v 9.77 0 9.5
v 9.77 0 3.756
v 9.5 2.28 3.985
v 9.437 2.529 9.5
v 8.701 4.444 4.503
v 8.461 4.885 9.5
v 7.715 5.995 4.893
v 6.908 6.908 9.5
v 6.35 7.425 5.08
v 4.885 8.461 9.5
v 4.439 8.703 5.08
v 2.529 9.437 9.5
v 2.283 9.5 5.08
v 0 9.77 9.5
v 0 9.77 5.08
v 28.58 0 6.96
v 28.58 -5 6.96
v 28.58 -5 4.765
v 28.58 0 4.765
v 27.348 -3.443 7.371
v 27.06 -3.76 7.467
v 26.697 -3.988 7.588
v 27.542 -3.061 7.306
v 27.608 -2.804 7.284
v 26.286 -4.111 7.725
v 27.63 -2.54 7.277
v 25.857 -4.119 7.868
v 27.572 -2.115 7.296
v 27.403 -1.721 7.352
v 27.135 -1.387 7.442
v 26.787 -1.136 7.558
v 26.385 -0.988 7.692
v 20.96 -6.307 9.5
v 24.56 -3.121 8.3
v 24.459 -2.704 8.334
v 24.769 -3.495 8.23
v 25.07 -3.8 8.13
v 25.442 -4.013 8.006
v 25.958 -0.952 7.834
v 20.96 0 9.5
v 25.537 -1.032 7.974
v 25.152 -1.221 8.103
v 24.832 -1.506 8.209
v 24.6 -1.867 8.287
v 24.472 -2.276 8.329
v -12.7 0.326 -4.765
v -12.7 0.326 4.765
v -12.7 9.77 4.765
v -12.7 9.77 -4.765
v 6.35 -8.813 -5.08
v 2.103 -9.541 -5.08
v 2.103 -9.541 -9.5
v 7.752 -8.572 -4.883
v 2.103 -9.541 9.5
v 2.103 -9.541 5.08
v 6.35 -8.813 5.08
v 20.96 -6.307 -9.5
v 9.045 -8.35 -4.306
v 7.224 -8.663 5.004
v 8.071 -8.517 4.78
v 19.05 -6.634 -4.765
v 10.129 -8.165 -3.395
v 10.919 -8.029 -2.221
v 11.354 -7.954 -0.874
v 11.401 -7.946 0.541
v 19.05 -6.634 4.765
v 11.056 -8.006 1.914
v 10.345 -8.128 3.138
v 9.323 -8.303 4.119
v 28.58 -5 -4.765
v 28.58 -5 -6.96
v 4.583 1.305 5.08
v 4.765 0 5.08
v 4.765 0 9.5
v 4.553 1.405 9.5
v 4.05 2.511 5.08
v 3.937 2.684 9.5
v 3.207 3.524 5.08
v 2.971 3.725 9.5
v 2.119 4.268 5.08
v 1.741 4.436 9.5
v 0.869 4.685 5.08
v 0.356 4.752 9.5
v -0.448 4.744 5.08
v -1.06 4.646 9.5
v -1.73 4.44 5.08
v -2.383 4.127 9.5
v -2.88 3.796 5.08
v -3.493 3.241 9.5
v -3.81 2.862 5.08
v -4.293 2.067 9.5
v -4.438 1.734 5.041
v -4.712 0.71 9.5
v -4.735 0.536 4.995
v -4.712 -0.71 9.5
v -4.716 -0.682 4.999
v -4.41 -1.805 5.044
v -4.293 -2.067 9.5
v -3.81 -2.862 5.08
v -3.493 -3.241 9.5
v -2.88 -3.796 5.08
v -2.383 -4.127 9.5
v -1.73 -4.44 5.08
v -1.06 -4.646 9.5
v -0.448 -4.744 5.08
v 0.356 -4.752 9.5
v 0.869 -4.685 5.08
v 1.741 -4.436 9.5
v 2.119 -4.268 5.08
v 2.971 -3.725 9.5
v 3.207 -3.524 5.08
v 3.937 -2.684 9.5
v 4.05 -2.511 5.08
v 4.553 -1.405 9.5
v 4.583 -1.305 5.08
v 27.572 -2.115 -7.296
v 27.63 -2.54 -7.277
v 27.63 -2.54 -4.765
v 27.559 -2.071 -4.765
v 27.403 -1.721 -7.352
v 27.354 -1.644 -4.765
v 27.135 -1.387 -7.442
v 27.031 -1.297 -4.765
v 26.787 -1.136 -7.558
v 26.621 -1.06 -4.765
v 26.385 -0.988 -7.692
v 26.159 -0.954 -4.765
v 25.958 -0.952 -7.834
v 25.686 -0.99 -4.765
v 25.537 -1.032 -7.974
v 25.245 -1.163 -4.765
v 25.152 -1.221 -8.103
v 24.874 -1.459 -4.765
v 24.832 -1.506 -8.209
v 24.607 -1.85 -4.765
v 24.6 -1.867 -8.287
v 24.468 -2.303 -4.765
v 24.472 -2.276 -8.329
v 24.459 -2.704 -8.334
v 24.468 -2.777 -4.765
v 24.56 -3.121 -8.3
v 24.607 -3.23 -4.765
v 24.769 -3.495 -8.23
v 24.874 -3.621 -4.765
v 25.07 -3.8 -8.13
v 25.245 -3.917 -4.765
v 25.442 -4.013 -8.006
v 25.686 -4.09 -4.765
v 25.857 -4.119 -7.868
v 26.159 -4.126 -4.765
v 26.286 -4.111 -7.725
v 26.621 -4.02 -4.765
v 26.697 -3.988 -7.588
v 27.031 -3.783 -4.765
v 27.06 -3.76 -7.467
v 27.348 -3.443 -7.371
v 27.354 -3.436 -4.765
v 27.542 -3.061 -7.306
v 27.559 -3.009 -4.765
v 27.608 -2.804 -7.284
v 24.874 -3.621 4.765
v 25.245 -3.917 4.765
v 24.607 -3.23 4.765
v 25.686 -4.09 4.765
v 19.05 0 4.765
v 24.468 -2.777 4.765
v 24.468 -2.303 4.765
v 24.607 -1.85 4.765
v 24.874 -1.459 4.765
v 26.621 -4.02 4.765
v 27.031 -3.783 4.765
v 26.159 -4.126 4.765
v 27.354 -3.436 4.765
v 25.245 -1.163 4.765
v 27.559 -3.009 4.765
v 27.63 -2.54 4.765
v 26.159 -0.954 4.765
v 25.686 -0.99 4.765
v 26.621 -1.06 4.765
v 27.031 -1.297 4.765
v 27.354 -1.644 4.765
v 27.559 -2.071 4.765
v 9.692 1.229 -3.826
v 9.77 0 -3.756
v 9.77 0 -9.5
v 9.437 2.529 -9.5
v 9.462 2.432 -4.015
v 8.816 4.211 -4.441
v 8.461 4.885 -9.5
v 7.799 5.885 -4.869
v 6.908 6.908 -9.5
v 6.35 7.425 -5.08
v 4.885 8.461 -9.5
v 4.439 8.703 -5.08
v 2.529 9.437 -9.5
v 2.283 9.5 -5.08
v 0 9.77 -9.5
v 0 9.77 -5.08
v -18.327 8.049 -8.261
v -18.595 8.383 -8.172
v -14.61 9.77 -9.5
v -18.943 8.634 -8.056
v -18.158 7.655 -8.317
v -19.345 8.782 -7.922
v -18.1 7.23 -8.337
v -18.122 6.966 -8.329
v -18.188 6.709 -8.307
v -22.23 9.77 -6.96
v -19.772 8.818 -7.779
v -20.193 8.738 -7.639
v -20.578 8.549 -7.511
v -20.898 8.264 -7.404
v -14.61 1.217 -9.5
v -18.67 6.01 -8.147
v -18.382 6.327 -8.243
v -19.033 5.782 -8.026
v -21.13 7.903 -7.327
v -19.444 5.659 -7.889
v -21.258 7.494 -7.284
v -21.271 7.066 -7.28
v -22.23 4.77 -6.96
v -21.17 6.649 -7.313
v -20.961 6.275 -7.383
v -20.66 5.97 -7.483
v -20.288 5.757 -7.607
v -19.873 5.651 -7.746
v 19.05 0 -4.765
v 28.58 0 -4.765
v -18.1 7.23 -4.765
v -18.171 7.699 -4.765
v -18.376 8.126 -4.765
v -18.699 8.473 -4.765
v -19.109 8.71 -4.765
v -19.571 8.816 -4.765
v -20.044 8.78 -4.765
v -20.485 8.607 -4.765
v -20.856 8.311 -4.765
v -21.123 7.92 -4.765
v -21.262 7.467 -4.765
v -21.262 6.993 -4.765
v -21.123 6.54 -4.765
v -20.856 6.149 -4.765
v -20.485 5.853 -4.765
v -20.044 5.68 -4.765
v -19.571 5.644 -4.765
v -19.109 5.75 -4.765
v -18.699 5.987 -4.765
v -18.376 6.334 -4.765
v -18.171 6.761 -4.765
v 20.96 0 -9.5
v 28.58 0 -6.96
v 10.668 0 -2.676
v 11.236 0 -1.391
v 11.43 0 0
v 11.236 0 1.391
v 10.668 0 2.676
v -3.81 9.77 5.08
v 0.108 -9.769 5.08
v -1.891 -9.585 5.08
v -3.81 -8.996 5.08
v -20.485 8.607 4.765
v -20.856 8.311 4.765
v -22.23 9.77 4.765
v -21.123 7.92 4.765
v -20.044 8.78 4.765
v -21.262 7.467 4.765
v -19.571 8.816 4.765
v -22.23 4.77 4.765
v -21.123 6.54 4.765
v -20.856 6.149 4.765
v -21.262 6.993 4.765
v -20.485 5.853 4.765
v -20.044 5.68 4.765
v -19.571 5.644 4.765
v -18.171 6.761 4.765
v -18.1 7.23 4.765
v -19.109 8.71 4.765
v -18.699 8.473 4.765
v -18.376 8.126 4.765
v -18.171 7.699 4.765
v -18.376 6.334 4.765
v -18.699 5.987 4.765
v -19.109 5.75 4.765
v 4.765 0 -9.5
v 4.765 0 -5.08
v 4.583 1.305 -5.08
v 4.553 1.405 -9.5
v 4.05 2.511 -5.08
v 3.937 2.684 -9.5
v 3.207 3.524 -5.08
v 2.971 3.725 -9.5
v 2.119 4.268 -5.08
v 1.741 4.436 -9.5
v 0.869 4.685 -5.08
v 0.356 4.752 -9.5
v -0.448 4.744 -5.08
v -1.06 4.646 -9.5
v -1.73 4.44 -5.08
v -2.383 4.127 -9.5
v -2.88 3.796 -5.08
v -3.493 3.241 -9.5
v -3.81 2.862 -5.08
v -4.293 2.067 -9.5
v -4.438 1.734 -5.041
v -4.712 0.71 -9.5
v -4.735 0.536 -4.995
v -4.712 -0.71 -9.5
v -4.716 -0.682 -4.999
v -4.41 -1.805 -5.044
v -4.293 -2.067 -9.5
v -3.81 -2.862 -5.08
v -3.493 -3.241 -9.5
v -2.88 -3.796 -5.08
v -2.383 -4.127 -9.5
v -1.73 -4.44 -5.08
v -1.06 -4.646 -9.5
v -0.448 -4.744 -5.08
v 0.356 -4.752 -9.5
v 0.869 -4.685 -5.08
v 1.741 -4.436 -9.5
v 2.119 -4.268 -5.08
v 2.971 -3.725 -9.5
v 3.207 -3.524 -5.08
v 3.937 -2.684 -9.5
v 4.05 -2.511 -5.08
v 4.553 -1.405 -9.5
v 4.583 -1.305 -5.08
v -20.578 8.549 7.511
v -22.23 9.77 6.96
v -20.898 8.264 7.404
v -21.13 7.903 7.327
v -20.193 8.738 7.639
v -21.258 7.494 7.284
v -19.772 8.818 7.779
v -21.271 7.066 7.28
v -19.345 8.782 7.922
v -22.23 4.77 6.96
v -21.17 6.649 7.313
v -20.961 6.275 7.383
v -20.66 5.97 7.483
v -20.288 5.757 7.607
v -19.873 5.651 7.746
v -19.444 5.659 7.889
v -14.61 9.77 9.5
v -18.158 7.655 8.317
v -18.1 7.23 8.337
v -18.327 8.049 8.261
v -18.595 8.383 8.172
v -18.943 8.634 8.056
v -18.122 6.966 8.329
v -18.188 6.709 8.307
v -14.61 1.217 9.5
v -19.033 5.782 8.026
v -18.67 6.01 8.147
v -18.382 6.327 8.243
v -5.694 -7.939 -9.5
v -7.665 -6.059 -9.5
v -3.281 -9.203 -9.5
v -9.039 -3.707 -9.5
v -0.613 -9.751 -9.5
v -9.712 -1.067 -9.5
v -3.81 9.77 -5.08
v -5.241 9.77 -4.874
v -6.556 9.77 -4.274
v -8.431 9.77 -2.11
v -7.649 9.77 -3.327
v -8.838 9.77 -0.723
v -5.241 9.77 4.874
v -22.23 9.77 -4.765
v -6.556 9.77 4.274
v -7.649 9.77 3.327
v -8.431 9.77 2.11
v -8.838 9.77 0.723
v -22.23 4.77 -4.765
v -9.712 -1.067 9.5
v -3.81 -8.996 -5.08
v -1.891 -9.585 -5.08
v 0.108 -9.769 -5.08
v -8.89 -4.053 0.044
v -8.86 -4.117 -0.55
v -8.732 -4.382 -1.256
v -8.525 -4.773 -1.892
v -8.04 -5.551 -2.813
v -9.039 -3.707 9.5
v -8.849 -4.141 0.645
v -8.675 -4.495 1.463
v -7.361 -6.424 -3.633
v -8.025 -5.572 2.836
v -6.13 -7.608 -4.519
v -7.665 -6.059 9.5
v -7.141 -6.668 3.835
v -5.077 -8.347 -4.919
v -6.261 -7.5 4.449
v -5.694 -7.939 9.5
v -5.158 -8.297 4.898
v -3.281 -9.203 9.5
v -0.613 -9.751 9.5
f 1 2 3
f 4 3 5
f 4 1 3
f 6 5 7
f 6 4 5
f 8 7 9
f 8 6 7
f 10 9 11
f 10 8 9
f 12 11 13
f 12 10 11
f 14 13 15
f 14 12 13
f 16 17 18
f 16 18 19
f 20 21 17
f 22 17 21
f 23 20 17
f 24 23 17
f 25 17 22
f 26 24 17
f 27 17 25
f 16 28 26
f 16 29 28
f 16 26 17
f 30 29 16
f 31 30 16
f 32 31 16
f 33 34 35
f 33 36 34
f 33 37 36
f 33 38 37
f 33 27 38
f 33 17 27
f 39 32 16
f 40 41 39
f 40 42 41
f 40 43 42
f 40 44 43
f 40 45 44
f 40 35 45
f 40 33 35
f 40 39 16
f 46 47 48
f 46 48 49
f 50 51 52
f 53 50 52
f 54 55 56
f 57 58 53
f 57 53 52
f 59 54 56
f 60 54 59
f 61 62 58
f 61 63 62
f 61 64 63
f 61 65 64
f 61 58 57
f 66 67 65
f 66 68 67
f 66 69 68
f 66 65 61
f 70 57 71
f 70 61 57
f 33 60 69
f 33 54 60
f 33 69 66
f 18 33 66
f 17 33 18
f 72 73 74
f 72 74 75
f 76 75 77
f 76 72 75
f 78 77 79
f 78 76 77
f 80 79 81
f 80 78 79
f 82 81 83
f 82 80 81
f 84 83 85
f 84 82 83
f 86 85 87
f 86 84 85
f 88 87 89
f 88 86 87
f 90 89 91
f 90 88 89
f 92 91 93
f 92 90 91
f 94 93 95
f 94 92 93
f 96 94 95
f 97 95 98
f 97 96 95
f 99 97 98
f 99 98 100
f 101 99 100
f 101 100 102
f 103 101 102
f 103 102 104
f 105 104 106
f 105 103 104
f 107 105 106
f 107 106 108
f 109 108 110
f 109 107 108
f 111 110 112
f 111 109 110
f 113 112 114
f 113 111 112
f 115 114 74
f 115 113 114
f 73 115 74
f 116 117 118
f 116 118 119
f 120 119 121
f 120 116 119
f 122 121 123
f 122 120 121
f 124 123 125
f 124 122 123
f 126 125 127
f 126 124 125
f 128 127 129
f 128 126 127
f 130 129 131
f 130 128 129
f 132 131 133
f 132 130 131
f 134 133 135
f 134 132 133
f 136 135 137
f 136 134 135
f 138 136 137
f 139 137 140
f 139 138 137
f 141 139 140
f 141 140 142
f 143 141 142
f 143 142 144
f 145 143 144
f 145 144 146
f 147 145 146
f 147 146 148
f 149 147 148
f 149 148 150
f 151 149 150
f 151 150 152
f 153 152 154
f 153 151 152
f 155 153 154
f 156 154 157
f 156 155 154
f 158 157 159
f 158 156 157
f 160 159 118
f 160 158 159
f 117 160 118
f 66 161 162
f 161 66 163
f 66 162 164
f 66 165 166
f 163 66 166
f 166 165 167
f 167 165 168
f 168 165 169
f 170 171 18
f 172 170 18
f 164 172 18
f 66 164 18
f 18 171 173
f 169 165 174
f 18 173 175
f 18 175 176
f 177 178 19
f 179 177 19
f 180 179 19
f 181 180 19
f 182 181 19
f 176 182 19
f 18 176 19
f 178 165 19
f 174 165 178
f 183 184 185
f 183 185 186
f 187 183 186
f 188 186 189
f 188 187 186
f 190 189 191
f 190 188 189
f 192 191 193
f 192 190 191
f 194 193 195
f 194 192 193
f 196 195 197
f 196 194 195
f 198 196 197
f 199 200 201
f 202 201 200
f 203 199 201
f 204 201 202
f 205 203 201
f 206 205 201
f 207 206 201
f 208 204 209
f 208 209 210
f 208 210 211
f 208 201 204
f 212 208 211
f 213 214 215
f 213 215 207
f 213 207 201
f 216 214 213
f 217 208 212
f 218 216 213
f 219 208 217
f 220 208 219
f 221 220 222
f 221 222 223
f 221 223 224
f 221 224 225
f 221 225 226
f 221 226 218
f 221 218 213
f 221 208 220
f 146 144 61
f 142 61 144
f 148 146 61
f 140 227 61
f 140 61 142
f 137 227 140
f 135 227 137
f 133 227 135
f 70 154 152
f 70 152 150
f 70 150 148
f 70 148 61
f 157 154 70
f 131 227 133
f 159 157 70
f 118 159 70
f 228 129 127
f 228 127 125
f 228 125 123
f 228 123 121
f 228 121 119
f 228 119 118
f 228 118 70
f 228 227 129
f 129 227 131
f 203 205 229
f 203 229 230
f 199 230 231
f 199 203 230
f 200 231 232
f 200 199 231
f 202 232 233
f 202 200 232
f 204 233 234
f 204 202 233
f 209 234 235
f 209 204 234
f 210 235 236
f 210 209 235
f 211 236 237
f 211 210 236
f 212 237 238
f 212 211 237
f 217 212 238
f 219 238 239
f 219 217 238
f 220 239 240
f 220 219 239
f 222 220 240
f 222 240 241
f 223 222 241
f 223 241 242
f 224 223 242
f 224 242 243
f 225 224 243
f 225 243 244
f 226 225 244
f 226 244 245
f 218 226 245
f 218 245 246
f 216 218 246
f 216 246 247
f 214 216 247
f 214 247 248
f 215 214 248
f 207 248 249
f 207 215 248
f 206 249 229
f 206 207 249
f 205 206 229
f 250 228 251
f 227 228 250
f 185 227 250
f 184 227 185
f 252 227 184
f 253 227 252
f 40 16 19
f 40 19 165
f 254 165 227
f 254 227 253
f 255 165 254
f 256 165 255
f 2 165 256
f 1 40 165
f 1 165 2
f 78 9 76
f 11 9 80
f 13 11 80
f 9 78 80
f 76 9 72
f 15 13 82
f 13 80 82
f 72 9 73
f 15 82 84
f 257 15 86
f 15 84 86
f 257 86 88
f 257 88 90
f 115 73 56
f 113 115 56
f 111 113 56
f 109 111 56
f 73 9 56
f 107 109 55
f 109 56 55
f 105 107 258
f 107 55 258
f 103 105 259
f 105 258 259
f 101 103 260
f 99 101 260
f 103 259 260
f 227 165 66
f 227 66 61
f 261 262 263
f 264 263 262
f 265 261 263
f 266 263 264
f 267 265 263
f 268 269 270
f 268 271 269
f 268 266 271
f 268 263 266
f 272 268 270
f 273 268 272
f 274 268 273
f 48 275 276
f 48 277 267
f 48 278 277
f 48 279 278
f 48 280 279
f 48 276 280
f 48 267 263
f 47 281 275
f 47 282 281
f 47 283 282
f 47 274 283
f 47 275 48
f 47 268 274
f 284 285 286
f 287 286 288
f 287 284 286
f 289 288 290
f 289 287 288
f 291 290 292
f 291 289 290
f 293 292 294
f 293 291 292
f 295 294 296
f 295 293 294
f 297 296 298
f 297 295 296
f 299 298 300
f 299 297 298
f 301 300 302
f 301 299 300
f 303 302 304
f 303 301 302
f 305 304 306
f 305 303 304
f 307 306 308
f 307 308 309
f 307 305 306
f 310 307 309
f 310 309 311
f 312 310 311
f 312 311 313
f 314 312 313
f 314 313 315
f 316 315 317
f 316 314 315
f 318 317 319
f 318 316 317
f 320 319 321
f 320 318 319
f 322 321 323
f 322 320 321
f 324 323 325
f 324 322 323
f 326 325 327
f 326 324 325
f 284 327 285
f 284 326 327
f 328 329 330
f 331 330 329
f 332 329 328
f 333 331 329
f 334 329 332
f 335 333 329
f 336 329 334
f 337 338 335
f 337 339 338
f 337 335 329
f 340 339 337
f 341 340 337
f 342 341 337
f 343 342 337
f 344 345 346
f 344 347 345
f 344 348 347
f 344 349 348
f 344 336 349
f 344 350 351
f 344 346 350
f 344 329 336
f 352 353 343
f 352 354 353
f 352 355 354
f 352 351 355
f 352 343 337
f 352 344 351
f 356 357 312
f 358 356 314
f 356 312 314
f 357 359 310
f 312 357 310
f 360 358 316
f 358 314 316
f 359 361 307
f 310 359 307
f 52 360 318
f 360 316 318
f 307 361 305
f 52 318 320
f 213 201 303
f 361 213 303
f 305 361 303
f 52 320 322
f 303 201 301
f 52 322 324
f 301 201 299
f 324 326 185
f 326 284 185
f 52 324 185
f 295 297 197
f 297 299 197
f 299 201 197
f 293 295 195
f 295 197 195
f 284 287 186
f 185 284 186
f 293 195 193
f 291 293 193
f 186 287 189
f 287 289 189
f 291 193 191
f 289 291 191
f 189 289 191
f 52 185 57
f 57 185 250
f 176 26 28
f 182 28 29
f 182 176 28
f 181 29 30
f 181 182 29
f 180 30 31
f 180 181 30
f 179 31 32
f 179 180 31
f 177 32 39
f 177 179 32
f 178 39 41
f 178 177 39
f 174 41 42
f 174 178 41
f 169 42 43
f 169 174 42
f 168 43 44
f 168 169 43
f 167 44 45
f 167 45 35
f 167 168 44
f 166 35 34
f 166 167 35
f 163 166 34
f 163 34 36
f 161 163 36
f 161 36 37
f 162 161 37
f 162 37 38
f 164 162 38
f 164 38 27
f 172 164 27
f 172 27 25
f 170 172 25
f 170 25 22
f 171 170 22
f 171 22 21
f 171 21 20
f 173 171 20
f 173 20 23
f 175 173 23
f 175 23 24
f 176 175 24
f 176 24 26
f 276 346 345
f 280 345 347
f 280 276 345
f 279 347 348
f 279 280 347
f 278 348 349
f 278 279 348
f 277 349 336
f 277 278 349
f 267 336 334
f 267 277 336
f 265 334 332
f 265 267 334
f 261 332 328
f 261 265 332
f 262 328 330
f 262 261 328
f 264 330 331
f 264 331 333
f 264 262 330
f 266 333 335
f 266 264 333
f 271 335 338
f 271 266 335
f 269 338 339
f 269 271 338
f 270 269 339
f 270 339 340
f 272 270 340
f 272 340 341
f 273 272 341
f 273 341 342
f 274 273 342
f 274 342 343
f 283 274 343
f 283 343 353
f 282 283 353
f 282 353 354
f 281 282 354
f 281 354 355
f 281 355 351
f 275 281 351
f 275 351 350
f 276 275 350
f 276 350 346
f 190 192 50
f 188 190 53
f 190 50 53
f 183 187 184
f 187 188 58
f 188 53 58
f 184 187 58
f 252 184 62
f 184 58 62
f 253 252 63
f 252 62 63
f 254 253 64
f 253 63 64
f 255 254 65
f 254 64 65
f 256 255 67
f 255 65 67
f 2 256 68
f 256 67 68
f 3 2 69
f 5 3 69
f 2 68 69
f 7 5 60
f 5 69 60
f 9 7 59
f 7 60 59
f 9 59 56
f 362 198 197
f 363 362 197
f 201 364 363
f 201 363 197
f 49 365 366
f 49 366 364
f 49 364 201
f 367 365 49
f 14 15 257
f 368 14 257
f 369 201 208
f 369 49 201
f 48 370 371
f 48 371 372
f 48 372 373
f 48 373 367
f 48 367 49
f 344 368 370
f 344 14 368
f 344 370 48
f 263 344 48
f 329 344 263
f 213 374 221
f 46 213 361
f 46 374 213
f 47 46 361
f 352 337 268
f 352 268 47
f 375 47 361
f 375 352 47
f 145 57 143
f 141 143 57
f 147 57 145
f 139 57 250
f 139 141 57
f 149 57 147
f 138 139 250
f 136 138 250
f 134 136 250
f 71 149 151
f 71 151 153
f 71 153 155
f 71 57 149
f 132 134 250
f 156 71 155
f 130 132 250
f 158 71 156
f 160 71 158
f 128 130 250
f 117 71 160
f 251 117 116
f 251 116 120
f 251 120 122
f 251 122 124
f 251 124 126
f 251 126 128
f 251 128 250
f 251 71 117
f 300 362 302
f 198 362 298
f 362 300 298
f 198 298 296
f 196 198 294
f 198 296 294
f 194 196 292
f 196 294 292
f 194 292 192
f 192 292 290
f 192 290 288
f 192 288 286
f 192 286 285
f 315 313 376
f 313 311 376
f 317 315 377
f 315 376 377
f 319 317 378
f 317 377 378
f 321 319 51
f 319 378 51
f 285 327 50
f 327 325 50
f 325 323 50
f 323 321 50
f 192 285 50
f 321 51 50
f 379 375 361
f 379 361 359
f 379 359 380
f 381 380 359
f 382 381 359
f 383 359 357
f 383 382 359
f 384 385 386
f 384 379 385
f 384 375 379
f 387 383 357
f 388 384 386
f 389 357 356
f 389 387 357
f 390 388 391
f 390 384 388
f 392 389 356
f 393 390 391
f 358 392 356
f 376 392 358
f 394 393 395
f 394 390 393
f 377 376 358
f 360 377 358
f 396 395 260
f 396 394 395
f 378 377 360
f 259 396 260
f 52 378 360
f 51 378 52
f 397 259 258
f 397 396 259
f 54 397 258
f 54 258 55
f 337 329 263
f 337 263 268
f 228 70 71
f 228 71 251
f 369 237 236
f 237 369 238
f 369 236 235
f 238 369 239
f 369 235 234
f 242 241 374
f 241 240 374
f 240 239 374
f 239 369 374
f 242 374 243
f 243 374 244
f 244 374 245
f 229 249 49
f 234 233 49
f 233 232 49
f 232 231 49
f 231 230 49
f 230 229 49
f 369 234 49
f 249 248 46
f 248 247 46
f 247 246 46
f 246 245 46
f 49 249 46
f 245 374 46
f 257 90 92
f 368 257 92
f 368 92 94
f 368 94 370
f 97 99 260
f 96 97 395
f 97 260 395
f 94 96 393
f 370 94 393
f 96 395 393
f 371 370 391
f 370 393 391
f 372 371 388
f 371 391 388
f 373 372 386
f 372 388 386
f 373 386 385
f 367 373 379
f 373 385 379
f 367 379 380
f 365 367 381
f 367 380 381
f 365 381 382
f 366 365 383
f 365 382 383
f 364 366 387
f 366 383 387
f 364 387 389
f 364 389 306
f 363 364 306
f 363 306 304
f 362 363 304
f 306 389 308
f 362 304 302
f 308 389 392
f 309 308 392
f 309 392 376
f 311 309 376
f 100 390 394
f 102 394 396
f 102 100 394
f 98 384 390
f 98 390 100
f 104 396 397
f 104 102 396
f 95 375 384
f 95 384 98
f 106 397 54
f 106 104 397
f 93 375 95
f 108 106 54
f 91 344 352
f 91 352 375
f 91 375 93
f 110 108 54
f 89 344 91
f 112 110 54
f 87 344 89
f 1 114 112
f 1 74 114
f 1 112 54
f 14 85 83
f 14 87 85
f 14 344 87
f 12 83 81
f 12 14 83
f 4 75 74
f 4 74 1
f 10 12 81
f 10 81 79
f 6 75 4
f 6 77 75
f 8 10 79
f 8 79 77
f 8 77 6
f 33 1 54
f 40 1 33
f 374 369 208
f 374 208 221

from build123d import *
from OCP.BRepFilletAPI import BRepFilletAPI_MakeChamfer

# Parameters (mm, degrees)
SKETCH1_R               = 4.765
BOSS_EXTRUDE1_DEPTH     = 9.5
CHAMFER5_SIZE           = 7.62
CHAMFER5_SIZE2          = 2.54
CHAMFER6_SIZE           = 2.54
CHAMFER6_SIZE2          = 7.62
SKETCH2_W               = 9.53
SKETCH2_H               = 9.53
CUT_EXTRUDE1_DEPTH      = 32.662585176
SKETCH2_2_W             = 9.53
SKETCH2_2_H             = 9.53
CUT_EXTRUDE2_DEPTH      = 32.662585176
CUT_EXTRUDE3_DEPTH      = 32.662585176
CUT_EXTRUDE3_DEPTH_BACK = 32.662585176
CUT_EXTRUDE4_DEPTH      = 32.662585236
CUT_EXTRUDE4_DEPTH_BACK = 32.662585236
SKETCH4_R               = 1.59


with BuildPart() as part:
    # Sketch1 → Boss-Extrude1 (new, symmetric)
    with BuildSketch(Plane.XY):
        with BuildLine():
            Line((0, 9.77), (-22.23, 9.77))
            Line((-22.23, 9.77), (-22.23, 4.77))
            Line((-22.23, 4.77), (-9.711509246, -1.067468107))
            ThreePointArc((-9.711509246, -1.067468107), (-5.694059685, -7.939180329), (2.103028838, -9.540973206))
            Line((2.103028838, -9.540973206), (28.58, -5))
            Line((28.58, -5), (28.58, 0))
            Line((28.58, 0), (9.77, 0))
            ThreePointArc((9.77, 0), (6.908433252, 6.908433252), (0, 9.77))
        make_face()
        Circle(SKETCH1_R, mode=Mode.SUBTRACT)
    extrude(amount=BOSS_EXTRUDE1_DEPTH, both=True)

    # Chamfer5
    chamfer5_edges = [part.edges().sort_by_distance(p)[0] for p in [
        (-22.23, 7.27, -9.5),
        (28.58, -2.5, -9.5),
    ]]
    chamfer5_side = [part.faces().sort_by_distance(p)[0] for p in [
        (6.52350029, 6.52350029, -9.5),
    ]]
    chamfer(chamfer5_edges, length=CHAMFER5_SIZE, length2=CHAMFER5_SIZE2, reference=chamfer5_side[0])

    # Chamfer6: one chamfer whose edges measure the first distance from different faces: ONE call of the kernel's chamfer builder (chamfer() names one face for all edges)
    chamfer6_edges_1 = [part.edges().sort_by_distance(p)[0] for p in [
        (-22.23, 7.27, 9.5),
    ]]
    chamfer6_side_1 = [part.faces().sort_by_distance(p)[0] for p in [
        (-22.23, 7.27, 1.27),
    ]]
    chamfer6_edges_2 = [part.edges().sort_by_distance(p)[0] for p in [
        (28.58, -2.5, 9.5),
    ]]
    chamfer6_side_2 = [part.faces().sort_by_distance(p)[0] for p in [
        (28.58, -2.5, 1.27),
    ]]
    chamfer6 = BRepFilletAPI_MakeChamfer(part.part.solid().wrapped)
    for e in chamfer6_edges_1:
        chamfer6.Add(CHAMFER6_SIZE, CHAMFER6_SIZE2, e.wrapped, chamfer6_side_1[0].wrapped)  # the first distance lies on this face
    for e in chamfer6_edges_2:
        chamfer6.Add(CHAMFER6_SIZE, CHAMFER6_SIZE2, e.wrapped, chamfer6_side_2[0].wrapped)  # the first distance lies on this face
    add(Compound.cast(chamfer6.Shape()), mode=Mode.REPLACE)

    # Sketch2 → Cut-Extrude1 (cut, through all)
    with BuildSketch(Plane(origin=(0, 0, 0), x_dir=(1, 0, 0), z_dir=(0, 1, 0))):
        with Locations((-17.465, 0)):
            Rectangle(SKETCH2_W, SKETCH2_H)
        with Locations((23.815, 0)):
            Rectangle(SKETCH2_W, SKETCH2_H)
    extrude(amount=-CUT_EXTRUDE1_DEPTH, mode=Mode.SUBTRACT)

    # Sketch2<2> → Cut-Extrude2 (cut, through all)
    with BuildSketch(Plane(origin=(0, 0, 0), x_dir=(1, 0, 0), z_dir=(0, 1, 0))):
        with Locations((-17.465, 0)):
            Rectangle(SKETCH2_2_W, SKETCH2_2_H)
        with Locations((23.815, 0)):
            Rectangle(SKETCH2_2_W, SKETCH2_2_H)
    extrude(amount=CUT_EXTRUDE2_DEPTH, mode=Mode.SUBTRACT)

    # Sketch3 → Cut-Extrude3 (cut, two sides: drawn at the far end of the back side and taken through both)
    with BuildSketch(Plane(origin=(0, 0, 0), x_dir=(1, 0, 0), z_dir=(0, 1, 0)).offset(-CUT_EXTRUDE3_DEPTH_BACK)):
        with BuildLine():
            Line((-3.81, 5.08), (6.35, 5.08))
            ThreePointArc((6.35, 5.08), (11.43, 0), (6.35, -5.08))
            Line((6.35, -5.08), (-3.81, -5.08))
            ThreePointArc((-3.81, -5.08), (-8.89, 0), (-3.81, 5.08))
        make_face()
    extrude(amount=CUT_EXTRUDE3_DEPTH + CUT_EXTRUDE3_DEPTH_BACK, mode=Mode.SUBTRACT)

    # Sketch4 → Cut-Extrude4 (cut, two sides: drawn at the far end of the back side and taken through both)
    with BuildSketch(Plane.XY.offset(-CUT_EXTRUDE4_DEPTH_BACK)):
        with Locations((-19.69, 7.23)):
            Circle(SKETCH4_R)
        with Locations((26.04, -2.54)):
            Circle(SKETCH4_R)
    extrude(amount=CUT_EXTRUDE4_DEPTH + CUT_EXTRUDE4_DEPTH_BACK, mode=Mode.SUBTRACT)


solid = part.part
